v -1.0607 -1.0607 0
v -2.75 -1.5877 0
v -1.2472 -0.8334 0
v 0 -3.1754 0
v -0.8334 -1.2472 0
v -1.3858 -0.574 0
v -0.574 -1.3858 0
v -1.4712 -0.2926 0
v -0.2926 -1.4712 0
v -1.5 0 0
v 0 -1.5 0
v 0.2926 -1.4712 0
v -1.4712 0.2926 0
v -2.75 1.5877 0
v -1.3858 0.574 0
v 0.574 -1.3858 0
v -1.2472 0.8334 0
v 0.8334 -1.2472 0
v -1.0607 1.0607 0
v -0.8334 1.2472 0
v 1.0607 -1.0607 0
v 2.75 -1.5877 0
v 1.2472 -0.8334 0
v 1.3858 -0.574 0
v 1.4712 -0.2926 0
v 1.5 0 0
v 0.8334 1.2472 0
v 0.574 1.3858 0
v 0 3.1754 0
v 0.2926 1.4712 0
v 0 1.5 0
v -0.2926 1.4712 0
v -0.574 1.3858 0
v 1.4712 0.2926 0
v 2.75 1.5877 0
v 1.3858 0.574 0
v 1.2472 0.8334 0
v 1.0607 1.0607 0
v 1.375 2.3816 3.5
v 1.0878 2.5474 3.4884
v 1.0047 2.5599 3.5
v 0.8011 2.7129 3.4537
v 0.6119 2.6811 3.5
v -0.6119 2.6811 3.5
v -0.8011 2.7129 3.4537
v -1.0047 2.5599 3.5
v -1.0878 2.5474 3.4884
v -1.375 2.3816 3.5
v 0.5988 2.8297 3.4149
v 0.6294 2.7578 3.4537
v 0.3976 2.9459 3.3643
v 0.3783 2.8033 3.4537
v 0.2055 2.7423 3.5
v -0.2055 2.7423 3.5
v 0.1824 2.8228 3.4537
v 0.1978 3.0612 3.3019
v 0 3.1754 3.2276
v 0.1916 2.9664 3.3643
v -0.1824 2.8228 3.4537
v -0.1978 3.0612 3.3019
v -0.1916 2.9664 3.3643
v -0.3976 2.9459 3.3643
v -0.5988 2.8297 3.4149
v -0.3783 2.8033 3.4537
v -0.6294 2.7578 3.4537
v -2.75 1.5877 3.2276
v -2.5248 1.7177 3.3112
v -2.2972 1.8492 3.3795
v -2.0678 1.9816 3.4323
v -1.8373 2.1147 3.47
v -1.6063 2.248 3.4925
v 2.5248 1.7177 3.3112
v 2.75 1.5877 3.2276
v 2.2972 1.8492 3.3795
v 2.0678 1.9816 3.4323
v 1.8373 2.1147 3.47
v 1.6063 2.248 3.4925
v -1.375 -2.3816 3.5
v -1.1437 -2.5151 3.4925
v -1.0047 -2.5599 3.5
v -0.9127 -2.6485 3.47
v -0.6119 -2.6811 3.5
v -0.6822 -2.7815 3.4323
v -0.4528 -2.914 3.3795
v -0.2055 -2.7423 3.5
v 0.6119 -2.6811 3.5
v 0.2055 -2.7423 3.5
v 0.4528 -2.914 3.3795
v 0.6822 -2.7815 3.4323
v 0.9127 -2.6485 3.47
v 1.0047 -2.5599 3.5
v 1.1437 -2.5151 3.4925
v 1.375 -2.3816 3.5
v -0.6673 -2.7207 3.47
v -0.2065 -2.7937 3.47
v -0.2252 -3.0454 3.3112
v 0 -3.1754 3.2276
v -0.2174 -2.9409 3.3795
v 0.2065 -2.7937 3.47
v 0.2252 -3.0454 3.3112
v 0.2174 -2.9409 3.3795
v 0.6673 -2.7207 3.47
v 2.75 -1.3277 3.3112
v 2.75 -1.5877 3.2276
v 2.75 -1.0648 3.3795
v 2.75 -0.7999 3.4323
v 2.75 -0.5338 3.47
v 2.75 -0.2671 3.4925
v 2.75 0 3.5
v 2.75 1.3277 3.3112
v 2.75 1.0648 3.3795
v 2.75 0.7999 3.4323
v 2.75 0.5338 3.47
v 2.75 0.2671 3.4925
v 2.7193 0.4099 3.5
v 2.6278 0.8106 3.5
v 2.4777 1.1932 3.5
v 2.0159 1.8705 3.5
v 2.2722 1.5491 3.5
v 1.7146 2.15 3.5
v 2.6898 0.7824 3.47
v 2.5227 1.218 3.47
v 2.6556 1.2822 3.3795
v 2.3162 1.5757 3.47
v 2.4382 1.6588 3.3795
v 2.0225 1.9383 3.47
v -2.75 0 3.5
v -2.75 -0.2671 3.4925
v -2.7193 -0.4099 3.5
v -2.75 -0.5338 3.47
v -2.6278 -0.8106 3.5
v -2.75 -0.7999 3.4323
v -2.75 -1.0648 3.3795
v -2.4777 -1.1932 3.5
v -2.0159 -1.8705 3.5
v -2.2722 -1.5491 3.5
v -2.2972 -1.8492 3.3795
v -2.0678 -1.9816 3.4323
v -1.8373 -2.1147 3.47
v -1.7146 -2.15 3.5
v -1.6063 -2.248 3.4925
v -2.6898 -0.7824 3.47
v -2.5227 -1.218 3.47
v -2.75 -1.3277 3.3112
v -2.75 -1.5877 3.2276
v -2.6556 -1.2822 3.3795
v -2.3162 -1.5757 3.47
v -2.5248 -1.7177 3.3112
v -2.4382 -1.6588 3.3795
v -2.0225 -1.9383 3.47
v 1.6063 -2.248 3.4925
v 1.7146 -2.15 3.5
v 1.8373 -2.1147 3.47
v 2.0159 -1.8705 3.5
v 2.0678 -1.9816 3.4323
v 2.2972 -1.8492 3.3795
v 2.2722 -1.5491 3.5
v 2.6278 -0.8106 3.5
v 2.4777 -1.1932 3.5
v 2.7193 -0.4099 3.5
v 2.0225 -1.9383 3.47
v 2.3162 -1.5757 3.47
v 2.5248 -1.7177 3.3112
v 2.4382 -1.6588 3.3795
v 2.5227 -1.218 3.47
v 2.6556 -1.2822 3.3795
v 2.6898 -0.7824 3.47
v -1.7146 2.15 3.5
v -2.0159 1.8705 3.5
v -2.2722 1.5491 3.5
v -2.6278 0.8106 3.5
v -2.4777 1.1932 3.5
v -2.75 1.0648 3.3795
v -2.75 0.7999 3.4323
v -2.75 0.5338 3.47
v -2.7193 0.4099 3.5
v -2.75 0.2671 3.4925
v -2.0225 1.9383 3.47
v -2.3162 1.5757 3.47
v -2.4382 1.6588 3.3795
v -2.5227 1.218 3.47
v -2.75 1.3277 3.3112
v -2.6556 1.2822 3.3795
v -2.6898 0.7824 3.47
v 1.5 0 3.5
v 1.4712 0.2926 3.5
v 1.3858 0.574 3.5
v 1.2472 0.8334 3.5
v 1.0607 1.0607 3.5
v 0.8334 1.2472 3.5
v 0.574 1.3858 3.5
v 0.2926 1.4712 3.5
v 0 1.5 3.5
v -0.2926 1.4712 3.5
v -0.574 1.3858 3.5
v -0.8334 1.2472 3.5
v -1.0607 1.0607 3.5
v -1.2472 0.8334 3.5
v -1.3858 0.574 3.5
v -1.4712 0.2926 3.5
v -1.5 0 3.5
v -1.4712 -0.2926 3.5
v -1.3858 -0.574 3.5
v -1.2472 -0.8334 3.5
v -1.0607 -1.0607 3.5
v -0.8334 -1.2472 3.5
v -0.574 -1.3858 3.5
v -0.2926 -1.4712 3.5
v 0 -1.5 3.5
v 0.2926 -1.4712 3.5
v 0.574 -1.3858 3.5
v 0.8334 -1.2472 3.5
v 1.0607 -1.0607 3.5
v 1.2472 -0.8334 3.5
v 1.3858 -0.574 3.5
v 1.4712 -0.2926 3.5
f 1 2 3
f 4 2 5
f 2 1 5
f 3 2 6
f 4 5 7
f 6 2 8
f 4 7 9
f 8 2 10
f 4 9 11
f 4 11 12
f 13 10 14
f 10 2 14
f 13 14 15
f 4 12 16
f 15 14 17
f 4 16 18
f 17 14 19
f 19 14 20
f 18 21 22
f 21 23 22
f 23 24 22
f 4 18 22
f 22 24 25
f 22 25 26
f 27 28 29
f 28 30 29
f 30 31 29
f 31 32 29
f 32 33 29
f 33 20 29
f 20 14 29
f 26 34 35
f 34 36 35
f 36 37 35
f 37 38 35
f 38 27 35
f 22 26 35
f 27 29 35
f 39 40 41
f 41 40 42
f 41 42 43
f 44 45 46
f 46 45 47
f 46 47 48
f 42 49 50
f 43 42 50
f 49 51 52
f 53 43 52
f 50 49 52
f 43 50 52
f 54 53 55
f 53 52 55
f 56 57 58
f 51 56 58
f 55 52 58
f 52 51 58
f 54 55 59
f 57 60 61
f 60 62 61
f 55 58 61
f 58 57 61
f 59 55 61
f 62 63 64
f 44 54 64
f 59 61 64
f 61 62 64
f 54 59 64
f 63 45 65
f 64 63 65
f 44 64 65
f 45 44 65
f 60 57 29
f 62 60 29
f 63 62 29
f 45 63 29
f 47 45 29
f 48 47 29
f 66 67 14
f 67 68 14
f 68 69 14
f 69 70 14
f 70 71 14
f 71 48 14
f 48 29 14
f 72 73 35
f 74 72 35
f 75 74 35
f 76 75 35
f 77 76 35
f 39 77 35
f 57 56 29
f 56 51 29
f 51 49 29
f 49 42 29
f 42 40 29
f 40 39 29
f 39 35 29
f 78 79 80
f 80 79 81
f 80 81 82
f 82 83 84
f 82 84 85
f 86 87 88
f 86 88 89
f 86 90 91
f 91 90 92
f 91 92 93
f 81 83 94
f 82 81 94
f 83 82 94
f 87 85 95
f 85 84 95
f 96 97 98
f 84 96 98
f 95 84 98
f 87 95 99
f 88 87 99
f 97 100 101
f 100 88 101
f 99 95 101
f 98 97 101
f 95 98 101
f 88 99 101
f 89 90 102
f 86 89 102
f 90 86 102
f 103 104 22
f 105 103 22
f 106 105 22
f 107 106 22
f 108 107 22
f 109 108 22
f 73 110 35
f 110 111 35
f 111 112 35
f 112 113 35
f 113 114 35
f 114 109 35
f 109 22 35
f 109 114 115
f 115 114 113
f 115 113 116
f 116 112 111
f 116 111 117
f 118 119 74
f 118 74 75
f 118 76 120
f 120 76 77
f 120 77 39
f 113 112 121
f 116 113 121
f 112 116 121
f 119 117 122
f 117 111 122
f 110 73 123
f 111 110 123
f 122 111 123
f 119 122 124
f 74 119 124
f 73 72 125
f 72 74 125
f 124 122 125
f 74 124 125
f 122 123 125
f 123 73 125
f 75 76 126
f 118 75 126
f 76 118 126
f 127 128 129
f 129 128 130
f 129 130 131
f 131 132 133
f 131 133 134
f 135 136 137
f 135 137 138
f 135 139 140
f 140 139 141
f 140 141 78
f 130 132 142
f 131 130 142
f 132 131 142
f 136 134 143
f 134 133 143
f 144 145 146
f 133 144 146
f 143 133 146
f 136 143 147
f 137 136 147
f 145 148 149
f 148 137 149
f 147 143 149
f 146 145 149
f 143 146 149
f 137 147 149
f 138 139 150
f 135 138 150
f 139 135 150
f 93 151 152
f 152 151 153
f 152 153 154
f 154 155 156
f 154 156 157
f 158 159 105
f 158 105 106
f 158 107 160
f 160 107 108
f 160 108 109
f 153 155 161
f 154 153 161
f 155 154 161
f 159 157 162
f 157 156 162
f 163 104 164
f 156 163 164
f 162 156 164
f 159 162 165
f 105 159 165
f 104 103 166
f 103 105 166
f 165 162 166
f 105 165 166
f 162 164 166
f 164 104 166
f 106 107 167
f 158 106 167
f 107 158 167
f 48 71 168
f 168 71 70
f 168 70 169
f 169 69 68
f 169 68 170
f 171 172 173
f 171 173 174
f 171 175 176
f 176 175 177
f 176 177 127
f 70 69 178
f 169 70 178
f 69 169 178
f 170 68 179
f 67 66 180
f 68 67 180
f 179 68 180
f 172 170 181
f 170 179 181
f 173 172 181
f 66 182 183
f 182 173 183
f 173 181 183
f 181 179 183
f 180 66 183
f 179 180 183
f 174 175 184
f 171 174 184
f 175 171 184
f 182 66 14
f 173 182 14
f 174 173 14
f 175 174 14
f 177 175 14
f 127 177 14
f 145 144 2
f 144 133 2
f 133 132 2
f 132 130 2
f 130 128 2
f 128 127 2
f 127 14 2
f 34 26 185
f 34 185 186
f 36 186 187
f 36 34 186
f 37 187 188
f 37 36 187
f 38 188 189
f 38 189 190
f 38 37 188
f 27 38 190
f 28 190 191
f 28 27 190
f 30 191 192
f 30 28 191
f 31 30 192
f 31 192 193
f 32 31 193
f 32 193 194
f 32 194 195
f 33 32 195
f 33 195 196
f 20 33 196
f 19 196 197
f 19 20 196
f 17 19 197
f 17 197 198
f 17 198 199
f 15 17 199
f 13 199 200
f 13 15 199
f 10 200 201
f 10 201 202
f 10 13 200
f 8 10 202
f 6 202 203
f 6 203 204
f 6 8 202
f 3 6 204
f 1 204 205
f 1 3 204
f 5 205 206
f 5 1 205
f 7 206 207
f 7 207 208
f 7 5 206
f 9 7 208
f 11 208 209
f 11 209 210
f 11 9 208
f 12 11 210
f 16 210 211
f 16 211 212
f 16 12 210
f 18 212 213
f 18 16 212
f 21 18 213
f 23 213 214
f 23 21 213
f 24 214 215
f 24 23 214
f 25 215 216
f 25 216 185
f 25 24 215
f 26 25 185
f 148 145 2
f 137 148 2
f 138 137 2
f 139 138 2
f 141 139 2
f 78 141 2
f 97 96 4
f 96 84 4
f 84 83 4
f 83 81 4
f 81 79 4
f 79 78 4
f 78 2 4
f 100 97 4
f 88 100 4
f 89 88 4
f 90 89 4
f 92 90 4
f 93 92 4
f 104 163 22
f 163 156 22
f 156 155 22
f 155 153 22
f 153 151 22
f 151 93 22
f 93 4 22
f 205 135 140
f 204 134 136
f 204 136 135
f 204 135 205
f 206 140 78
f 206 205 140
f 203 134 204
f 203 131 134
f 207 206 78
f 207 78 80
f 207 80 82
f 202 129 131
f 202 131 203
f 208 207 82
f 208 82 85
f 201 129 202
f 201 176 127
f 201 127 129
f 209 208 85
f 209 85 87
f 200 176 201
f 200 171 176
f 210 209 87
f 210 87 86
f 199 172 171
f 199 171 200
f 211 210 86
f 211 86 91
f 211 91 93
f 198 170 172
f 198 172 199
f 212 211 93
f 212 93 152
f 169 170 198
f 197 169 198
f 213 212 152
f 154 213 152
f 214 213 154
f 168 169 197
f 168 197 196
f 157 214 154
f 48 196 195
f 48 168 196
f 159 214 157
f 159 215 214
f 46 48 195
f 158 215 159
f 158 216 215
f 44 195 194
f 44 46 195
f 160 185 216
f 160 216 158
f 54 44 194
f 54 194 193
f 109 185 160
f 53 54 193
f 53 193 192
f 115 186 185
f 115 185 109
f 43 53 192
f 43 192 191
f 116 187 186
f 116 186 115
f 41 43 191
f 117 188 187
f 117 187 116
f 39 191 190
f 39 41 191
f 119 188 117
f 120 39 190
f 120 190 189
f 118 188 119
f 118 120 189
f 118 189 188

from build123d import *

# Parameters (mm, degrees)
SKETCH_1_R      = 1.5
EXTRUDE_1_DEPTH = 3.5


with BuildPart() as part:
    # ｽｹｯﾁ1 → ﾎﾞｽ - 押し出し1 (new body)
    with BuildSketch(Plane.XY):
        Polygon((0, 3.175426481), (-2.75, 1.58771324), (-2.75, -1.58771324), (0, -3.175426481), (2.75, -1.58771324), (2.75, 1.58771324), align=None)
        Circle(SKETCH_1_R, mode=Mode.SUBTRACT)
    extrude(amount=EXTRUDE_1_DEPTH)

    # ｽｹｯﾁ5 → ｶｯﾄ - 回転2 (revolve, cut)
    with BuildSketch(Plane(origin=(0, 0, 0), x_dir=(0, 0, -1), z_dir=(1, 0, 0))):
        with BuildLine():
            Line((-3.227591474, 3.175426481), (-3.5, 3.175426481))
            Line((-3.5, 3.175426481), (-3.5, 2.75))
            ThreePointArc((-3.5, 2.75), (-3.368682669, 2.965842434), (-3.227591474, 3.175426481))
        make_face()
    revolve(axis=Axis((0, 0, 0), (0, 0, 1)), mode=Mode.SUBTRACT)


solid = part.part
